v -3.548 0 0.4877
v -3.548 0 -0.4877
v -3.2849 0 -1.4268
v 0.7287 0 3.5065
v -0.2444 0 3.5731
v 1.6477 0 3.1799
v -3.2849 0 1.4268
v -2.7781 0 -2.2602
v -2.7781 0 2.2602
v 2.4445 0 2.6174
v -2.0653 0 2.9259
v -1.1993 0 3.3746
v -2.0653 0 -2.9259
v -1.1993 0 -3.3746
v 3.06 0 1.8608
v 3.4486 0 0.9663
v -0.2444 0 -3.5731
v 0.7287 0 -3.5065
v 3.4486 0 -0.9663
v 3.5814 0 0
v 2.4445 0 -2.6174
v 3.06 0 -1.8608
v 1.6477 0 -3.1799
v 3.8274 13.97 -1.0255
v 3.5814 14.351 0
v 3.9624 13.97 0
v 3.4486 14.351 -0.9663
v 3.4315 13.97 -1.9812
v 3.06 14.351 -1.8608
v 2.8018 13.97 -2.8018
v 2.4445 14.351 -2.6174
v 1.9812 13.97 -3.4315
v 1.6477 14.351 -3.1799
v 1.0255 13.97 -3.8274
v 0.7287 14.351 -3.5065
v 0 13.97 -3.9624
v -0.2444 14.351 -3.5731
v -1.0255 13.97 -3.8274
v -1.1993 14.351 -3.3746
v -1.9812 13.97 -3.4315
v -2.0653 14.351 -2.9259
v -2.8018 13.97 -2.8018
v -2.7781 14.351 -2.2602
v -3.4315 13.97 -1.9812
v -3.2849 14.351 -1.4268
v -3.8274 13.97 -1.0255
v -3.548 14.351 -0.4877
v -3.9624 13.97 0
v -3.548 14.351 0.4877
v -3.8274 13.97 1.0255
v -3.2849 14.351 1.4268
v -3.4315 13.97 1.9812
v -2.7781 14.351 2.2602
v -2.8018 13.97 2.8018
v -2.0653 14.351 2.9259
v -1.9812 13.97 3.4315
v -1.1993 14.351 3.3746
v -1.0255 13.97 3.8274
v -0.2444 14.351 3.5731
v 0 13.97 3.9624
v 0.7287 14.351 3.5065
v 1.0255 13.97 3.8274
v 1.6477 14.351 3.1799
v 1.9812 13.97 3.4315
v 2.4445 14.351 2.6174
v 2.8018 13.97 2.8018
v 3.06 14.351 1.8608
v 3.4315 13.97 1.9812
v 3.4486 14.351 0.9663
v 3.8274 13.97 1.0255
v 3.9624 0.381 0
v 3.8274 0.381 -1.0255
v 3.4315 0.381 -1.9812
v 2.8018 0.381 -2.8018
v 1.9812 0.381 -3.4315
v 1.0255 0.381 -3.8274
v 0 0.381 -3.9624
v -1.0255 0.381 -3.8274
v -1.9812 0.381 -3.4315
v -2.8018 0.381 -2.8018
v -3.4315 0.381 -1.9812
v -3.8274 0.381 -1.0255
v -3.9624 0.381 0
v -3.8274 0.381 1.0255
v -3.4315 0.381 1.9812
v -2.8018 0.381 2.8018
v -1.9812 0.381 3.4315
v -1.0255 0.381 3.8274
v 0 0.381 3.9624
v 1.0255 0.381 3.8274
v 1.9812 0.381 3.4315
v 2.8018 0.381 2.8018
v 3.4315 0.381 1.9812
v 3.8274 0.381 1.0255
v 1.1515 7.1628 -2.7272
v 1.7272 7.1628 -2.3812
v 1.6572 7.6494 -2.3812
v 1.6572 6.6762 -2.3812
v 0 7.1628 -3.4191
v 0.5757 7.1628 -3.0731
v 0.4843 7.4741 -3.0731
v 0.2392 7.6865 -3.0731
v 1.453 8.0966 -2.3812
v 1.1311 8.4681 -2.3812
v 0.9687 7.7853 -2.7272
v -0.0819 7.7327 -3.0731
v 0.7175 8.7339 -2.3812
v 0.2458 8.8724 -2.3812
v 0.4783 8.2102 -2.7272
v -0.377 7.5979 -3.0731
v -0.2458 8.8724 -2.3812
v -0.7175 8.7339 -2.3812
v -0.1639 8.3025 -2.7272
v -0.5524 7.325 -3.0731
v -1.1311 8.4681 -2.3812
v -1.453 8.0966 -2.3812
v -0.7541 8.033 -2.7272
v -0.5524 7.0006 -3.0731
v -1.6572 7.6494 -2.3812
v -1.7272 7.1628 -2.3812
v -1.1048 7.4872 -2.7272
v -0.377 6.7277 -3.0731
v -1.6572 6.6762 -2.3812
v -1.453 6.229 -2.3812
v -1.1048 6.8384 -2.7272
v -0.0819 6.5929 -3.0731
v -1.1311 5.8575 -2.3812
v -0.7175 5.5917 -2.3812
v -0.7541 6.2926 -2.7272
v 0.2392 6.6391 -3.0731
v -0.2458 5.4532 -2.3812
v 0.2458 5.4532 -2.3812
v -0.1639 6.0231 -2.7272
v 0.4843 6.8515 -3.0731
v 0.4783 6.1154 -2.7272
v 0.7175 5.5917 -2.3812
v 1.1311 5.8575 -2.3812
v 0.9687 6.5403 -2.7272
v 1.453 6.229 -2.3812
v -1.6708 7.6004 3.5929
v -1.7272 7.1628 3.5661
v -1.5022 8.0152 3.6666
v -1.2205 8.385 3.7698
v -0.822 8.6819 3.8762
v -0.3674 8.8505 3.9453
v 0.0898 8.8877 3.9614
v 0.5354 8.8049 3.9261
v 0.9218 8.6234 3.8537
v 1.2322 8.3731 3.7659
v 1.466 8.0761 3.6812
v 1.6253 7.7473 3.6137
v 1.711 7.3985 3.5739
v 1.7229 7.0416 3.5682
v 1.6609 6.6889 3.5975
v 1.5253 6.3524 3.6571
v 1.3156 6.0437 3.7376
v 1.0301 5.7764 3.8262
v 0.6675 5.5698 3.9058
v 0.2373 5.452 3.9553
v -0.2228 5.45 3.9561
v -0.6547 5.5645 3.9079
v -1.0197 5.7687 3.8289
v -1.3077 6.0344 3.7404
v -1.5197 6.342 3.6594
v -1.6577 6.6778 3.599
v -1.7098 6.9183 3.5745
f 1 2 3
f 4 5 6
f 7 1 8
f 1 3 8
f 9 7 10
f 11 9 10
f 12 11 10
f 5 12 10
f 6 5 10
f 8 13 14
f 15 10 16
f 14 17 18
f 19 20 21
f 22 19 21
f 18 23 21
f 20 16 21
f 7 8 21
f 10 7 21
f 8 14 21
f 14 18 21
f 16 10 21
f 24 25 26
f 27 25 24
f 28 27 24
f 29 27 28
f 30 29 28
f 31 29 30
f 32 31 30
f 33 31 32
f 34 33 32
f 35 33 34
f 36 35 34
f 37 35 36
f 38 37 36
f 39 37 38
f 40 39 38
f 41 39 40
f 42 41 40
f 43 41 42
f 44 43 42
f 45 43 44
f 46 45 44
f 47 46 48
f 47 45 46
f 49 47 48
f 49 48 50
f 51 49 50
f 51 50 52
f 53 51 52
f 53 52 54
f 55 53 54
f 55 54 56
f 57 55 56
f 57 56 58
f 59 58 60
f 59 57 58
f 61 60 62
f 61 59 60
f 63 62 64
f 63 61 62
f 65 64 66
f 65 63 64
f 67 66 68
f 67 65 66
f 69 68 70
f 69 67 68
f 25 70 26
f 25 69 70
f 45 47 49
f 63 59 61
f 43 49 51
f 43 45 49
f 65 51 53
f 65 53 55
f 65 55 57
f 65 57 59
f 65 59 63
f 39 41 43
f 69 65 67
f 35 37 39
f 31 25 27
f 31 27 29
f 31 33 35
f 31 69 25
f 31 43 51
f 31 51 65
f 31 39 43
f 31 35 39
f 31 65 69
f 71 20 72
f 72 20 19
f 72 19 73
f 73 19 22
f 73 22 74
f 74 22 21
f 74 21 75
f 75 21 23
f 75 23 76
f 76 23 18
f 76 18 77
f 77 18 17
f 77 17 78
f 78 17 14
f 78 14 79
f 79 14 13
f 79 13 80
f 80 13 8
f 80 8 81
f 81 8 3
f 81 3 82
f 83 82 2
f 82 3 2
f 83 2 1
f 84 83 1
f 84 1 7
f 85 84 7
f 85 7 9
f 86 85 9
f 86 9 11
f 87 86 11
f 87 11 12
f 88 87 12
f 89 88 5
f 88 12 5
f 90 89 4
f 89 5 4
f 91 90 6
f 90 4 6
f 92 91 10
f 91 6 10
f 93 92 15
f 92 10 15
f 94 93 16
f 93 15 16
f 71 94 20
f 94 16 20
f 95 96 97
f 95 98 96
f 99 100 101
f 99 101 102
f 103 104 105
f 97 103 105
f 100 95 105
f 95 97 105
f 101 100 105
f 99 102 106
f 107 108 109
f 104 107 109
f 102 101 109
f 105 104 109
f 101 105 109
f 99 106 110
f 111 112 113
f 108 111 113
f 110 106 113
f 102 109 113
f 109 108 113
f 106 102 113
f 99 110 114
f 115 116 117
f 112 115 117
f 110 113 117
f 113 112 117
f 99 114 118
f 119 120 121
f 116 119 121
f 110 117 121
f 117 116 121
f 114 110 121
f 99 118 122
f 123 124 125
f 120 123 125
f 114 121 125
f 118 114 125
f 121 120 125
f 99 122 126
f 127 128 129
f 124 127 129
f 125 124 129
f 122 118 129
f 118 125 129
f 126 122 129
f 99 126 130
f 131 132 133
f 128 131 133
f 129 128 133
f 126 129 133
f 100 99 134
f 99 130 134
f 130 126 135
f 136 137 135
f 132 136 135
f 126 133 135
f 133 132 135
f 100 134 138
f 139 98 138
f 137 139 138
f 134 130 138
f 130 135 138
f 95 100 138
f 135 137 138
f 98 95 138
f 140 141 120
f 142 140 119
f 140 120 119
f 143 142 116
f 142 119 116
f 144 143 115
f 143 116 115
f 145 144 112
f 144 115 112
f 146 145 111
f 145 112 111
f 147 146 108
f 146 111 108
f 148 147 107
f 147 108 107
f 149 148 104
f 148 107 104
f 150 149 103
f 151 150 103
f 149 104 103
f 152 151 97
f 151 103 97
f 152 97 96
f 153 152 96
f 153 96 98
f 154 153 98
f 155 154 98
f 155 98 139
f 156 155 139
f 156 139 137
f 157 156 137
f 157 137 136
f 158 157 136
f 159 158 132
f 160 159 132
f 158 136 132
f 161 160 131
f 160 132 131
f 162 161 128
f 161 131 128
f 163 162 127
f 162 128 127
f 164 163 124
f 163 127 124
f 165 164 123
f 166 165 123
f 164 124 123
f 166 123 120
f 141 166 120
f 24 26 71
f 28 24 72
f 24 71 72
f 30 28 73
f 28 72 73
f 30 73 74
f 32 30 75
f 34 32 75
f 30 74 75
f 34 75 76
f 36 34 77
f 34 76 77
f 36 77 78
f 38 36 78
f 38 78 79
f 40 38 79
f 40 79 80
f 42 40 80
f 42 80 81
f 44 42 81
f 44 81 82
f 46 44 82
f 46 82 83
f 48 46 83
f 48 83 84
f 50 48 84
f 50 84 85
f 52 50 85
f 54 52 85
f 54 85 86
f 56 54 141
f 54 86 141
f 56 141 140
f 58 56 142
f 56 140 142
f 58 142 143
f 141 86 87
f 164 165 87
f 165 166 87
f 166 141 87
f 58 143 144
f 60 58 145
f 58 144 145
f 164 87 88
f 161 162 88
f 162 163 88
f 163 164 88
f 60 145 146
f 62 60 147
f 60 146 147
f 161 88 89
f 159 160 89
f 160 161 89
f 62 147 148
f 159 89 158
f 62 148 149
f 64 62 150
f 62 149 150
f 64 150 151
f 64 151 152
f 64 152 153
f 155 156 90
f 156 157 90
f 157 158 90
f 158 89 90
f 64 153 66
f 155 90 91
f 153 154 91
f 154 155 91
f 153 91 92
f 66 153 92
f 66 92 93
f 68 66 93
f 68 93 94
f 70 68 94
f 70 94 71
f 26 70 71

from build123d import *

# Parameters (mm, degrees)
SKETCH1_R                           = 3.9624
BOSS_EXTRUDE1_DEPTH                 = 14.351
CHAMFER1_SIZE                       = 0.381
F_9_64_0_14063_DIAMETER_HOLE3_D     = 3.4544
F_9_64_0_14063_DIAMETER_HOLE3_DEPTH = 6.35
F_9_64_0_14063_DIAMETER_HOLE3_TIP   = 1.037806461


with BuildPart() as part:
    # Sketch1 → Boss-Extrude1 (new body)
    with BuildSketch(Plane(origin=(0, 0, 0), x_dir=(1, 0, 0), z_dir=(0, 1, 0))):
        Circle(SKETCH1_R)
    extrude(amount=BOSS_EXTRUDE1_DEPTH)

    # Chamfer1
    chamfer1_edges = [part.edges().sort_by_distance(p)[0] for p in [
        (-3.9624, 0, 0),
        (-3.9624, 14.351, 0),
    ]]
    chamfer(chamfer1_edges, length=CHAMFER1_SIZE)

    # 9/64 (0.14063) Diameter Hole3
    with Locations(Plane.XY.offset(3.96875)):
        with Locations((0, 7.1628)):
            Hole(F_9_64_0_14063_DIAMETER_HOLE3_D / 2, depth=F_9_64_0_14063_DIAMETER_HOLE3_DEPTH)
            with Locations((0, 0, -(F_9_64_0_14063_DIAMETER_HOLE3_DEPTH + F_9_64_0_14063_DIAMETER_HOLE3_TIP / 2))):  # 118° drill point
                Cone(0, F_9_64_0_14063_DIAMETER_HOLE3_D / 2, F_9_64_0_14063_DIAMETER_HOLE3_TIP, mode=Mode.SUBTRACT)


solid = part.part
